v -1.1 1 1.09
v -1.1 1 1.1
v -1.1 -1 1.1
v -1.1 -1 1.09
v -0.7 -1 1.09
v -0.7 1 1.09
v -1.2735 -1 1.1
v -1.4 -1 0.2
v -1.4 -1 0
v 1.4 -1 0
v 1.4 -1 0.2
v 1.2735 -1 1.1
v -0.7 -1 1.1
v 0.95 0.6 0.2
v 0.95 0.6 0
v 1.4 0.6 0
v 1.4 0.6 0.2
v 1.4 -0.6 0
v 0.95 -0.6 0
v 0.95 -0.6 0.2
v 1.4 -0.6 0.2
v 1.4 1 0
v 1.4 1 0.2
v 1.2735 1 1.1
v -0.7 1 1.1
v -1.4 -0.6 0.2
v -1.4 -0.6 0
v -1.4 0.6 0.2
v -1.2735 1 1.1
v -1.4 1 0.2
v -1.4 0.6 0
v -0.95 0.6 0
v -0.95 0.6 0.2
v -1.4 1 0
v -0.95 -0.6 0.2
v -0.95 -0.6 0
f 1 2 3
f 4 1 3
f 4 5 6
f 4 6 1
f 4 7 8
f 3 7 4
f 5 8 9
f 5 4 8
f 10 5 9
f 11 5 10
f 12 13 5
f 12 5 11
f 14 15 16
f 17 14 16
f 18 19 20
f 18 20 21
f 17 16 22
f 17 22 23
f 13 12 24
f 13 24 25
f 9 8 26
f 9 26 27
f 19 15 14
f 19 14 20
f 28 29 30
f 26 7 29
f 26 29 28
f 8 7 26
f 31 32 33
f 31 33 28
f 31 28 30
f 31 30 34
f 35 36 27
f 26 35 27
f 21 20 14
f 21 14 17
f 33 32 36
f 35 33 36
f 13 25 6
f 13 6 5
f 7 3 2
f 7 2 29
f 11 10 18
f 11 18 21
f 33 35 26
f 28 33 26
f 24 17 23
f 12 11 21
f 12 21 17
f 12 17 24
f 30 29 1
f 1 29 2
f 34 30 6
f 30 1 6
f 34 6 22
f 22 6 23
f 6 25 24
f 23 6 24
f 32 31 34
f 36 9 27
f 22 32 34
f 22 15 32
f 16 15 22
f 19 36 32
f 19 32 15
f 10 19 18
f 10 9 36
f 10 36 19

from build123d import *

# Parameters (mm, degrees)
PAD_DEPTH       = 1
SKETCH003_W     = 0.4
SKETCH003_H     = 2
POCKET_DEPTH    = 0.01
SKETCH005_W     = 0.95
SKETCH005_H     = 1.2
POCKET001_DEPTH = 0.2


with BuildPart() as part:
    # Sketch → Pad (new body, symmetric)
    with BuildSketch(Plane.XZ):
        Polygon((-1.4, 0), (1.4, 0), (1.4, 0.2), (1.273513, 1.1), (-1.273513, 1.1), (-1.4, 0.2), align=None)
    extrude(amount=PAD_DEPTH, both=True)

    # Sketch003 (on Face1 of Pad) → Pocket (cut)
    with BuildSketch(Plane(origin=(0, 0, 1.1), x_dir=(-1, 0, 0), z_dir=(0, 0, 1))):
        with Locations((0.9, 0)):
            Rectangle(SKETCH003_W, SKETCH003_H)
    extrude(amount=-POCKET_DEPTH, mode=Mode.SUBTRACT)

    # Sketch005 (on Face7 of Pocket) → Pocket001 (cut)
    with BuildSketch(Plane(origin=(0, 0, 0), x_dir=(1, 0, 0), z_dir=(0, 0, -1))):
        with Locations((1.425, 0)):
            Rectangle(SKETCH005_W, SKETCH005_H)
    pocket001 = extrude(amount=-POCKET001_DEPTH, mode=Mode.SUBTRACT)

    # Mirrored: Pocket001 across YZ
    add(pocket001.mirror(Plane.YZ), mode=Mode.SUBTRACT)


solid = part.part
